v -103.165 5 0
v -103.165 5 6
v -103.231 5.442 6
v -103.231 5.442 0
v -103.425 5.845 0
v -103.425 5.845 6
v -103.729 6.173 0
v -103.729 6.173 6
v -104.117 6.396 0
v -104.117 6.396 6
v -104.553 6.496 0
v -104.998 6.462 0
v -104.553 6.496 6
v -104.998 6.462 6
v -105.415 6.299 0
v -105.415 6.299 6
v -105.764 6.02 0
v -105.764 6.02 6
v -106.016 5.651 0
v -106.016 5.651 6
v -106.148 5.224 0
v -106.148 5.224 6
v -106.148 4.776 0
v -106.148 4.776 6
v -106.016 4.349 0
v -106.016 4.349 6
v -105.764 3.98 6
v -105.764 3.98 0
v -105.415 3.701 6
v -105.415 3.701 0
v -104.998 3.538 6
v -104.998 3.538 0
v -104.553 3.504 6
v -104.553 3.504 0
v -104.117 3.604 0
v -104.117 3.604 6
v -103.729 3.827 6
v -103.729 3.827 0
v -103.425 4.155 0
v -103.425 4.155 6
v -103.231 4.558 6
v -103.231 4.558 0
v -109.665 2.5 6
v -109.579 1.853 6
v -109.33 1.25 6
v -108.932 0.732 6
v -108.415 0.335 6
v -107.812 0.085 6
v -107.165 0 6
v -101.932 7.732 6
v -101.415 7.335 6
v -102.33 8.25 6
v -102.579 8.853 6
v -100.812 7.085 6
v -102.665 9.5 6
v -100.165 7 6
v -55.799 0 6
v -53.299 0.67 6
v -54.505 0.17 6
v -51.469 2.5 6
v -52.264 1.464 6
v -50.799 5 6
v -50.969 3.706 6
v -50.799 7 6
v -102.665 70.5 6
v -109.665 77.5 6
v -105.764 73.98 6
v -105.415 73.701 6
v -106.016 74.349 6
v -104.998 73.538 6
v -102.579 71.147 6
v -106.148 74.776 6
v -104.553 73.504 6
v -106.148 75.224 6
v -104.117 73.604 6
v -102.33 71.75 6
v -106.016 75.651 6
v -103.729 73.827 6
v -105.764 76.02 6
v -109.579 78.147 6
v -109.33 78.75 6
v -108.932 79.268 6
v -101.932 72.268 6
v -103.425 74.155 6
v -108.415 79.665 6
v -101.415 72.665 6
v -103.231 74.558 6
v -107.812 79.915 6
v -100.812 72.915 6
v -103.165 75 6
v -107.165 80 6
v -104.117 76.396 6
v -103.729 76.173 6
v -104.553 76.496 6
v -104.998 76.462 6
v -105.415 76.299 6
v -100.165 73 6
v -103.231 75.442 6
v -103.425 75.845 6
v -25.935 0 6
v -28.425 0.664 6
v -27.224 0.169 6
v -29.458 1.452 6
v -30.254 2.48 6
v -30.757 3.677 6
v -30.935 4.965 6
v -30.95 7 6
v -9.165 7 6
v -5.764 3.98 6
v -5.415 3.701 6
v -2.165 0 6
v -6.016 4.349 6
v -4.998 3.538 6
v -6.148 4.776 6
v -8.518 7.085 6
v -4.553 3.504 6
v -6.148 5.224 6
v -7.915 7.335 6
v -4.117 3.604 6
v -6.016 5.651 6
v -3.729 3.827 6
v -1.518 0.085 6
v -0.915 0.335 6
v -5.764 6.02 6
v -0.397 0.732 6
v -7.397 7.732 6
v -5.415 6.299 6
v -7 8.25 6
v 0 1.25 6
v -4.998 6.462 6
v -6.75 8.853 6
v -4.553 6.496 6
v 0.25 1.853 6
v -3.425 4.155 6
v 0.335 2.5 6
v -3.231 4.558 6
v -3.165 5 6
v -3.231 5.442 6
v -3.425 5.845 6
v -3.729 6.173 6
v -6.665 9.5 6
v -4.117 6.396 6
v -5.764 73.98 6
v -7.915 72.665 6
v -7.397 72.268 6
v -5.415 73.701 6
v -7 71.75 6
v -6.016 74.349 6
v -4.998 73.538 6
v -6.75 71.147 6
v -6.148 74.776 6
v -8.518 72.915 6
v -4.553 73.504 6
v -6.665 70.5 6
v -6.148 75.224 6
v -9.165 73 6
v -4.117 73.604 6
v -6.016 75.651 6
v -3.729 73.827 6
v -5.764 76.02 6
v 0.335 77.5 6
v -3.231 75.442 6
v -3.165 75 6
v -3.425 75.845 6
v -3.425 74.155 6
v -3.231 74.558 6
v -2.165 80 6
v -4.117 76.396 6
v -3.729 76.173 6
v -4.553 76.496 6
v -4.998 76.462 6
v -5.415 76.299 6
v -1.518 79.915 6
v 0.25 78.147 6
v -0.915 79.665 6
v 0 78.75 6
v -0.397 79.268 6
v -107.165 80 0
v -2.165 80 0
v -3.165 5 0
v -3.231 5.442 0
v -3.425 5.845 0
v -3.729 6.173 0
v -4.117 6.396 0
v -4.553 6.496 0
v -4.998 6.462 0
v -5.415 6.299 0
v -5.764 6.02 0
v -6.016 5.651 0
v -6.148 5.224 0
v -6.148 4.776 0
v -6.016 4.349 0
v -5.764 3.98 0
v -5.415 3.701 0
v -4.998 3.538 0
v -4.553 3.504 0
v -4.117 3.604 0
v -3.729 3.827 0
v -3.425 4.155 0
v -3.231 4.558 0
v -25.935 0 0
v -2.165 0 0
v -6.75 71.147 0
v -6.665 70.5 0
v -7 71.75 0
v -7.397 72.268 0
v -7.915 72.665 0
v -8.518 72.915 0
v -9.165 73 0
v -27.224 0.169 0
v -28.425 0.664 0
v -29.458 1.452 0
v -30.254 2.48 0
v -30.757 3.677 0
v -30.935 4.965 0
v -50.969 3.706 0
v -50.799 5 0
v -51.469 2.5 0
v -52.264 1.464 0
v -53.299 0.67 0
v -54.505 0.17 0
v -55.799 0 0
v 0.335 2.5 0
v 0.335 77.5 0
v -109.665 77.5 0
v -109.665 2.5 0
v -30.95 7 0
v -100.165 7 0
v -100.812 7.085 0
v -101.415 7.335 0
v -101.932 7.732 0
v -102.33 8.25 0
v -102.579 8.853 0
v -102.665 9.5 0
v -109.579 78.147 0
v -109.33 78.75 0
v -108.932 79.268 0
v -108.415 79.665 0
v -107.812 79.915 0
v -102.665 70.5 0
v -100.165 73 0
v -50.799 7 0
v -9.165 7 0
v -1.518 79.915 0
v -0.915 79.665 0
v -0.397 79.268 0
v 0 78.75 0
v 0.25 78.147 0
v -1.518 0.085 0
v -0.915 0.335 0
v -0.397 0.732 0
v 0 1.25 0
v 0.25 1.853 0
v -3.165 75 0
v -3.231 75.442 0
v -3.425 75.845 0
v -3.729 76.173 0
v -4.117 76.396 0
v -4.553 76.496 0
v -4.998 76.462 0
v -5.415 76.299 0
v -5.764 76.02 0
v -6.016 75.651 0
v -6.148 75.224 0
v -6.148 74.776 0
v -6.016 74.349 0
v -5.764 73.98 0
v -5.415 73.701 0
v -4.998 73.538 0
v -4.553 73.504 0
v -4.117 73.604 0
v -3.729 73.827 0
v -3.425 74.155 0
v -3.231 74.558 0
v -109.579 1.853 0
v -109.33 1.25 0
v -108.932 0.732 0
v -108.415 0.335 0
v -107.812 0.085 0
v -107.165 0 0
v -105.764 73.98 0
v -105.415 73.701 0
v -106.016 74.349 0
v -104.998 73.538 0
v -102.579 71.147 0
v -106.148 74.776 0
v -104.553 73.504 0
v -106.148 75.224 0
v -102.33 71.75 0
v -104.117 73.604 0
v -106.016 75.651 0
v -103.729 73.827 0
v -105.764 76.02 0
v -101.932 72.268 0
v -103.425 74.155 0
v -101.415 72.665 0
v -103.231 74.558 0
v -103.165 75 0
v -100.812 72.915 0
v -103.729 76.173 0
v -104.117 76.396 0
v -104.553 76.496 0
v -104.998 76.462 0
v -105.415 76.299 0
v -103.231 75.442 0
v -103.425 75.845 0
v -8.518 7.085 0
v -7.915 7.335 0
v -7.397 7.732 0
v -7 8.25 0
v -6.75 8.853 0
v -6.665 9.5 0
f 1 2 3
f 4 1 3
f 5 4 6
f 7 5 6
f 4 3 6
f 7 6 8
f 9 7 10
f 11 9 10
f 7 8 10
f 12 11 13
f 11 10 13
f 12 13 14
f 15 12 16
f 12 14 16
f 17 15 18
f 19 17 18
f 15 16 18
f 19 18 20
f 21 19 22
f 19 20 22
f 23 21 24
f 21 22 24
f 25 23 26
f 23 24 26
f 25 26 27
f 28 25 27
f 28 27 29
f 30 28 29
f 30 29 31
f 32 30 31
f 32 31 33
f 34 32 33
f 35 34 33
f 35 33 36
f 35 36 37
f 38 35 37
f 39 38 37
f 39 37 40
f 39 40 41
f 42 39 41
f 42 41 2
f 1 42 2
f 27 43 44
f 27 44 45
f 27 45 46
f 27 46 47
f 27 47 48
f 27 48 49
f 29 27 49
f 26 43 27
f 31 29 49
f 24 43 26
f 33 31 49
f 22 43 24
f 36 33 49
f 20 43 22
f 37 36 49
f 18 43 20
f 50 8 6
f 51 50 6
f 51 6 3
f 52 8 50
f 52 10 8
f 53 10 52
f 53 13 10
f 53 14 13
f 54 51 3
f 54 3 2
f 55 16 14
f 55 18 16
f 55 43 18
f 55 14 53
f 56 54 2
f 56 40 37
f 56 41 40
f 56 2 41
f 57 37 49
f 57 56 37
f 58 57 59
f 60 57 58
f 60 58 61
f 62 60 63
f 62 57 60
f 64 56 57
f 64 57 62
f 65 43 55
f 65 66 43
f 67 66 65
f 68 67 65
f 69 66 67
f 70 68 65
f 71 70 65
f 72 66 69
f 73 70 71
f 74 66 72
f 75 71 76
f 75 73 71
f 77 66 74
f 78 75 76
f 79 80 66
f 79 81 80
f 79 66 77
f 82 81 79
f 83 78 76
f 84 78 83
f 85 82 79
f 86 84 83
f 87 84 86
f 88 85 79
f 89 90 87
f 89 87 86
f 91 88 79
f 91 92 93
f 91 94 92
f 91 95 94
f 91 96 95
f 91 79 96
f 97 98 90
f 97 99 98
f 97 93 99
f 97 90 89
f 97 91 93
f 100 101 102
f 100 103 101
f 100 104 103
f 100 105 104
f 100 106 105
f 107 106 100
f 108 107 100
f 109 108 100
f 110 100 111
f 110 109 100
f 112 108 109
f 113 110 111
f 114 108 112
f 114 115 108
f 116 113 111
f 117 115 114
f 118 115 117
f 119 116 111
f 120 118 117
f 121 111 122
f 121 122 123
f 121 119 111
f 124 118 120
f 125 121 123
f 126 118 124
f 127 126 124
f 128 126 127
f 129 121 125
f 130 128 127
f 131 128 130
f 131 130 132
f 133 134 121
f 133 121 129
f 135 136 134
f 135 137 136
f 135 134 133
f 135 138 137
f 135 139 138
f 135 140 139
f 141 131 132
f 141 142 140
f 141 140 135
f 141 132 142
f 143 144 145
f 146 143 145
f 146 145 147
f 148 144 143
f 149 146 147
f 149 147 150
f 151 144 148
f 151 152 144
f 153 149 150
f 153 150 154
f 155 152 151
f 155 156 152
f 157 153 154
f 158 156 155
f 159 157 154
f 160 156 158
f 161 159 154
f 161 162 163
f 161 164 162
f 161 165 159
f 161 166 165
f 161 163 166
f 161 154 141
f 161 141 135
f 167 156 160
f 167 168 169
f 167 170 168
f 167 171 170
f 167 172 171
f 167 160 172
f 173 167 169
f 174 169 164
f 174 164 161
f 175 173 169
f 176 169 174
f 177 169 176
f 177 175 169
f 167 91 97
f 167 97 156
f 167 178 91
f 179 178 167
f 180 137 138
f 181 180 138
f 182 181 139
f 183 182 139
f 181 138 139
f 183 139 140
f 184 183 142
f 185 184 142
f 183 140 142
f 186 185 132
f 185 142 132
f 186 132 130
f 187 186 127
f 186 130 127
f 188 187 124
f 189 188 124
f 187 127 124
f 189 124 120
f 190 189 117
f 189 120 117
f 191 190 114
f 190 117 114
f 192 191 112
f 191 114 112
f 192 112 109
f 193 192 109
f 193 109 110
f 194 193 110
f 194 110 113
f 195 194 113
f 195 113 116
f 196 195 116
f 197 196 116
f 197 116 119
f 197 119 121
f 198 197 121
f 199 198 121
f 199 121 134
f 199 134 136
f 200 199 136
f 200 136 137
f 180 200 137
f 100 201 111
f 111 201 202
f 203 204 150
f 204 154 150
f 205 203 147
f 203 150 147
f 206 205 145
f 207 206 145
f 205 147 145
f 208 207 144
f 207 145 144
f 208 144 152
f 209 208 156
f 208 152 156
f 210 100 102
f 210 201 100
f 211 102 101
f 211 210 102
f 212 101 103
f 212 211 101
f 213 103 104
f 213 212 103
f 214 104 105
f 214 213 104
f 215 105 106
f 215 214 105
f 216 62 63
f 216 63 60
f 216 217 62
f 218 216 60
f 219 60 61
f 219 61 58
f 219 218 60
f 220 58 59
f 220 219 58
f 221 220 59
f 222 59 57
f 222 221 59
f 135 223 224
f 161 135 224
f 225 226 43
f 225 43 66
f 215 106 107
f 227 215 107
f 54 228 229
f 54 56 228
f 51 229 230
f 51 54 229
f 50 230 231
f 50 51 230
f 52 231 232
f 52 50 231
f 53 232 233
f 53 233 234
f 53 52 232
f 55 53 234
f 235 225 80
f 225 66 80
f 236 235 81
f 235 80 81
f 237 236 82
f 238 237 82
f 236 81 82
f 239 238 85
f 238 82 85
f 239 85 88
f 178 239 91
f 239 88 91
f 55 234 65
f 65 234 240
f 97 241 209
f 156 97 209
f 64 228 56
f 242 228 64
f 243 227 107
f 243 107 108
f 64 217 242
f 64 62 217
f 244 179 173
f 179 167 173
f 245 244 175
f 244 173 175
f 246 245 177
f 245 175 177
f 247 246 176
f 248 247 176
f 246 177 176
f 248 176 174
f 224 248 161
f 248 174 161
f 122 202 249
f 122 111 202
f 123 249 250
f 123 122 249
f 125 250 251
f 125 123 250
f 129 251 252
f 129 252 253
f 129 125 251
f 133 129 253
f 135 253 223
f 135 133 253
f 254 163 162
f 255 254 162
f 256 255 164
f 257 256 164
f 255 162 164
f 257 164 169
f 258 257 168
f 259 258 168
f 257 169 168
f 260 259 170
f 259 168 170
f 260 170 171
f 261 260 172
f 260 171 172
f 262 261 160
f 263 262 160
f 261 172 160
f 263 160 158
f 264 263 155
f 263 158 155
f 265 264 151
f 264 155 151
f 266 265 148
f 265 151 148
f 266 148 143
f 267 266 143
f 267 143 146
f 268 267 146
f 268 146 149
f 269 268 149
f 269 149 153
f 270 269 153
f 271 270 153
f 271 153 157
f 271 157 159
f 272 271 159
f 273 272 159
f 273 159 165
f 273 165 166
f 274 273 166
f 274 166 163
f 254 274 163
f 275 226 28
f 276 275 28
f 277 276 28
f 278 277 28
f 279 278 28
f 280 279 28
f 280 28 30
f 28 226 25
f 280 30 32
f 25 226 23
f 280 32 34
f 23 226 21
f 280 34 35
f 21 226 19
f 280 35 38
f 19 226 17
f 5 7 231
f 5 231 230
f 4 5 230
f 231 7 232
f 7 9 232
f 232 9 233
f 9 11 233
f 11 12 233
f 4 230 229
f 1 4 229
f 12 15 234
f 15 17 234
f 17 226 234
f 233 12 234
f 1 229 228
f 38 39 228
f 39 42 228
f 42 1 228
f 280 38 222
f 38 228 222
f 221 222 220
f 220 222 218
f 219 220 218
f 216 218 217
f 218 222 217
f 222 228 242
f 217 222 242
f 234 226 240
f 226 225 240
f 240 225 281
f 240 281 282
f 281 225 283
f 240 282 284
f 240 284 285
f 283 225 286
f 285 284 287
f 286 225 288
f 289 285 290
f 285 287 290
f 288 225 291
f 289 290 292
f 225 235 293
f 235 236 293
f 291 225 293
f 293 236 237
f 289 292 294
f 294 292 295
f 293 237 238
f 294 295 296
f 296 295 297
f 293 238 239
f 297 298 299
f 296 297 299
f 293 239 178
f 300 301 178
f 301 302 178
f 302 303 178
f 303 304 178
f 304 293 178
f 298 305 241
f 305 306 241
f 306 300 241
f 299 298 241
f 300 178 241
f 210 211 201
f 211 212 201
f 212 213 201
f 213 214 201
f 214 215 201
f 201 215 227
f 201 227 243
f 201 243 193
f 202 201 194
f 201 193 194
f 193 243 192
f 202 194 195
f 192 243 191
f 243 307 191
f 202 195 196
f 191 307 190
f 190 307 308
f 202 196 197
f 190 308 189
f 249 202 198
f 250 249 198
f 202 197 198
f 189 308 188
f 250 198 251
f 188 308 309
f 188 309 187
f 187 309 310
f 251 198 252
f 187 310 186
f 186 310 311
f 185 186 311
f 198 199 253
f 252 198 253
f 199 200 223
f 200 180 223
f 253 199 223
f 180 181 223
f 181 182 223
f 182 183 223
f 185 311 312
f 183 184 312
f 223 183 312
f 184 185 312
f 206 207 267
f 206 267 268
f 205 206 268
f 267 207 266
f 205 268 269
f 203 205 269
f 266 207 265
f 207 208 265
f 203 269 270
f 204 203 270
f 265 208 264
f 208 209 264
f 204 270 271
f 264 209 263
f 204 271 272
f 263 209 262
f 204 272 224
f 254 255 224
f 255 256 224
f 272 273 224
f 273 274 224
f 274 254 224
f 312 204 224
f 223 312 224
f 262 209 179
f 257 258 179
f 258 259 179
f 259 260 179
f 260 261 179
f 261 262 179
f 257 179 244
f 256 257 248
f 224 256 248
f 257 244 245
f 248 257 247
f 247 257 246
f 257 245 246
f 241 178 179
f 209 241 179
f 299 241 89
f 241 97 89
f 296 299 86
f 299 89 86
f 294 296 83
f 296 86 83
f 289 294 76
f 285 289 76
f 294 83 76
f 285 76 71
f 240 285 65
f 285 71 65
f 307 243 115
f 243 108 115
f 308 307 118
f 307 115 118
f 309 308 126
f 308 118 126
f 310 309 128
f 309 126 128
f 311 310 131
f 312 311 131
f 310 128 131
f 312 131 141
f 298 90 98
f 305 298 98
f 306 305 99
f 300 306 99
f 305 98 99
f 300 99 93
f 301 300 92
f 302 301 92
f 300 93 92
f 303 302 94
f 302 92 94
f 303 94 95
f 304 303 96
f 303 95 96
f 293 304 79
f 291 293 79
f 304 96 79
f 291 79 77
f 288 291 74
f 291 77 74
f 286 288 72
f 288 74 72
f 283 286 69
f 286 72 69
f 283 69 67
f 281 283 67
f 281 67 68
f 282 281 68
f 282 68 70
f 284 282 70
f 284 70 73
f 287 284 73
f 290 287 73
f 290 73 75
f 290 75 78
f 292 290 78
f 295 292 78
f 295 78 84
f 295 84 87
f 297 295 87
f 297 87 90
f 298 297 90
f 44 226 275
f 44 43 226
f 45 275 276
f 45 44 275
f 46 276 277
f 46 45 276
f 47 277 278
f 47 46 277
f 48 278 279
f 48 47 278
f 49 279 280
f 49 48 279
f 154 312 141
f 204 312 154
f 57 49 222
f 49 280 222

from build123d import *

# Parameters (mm, degrees)
SKETCH2_W               = 110
SKETCH2_H               = 80
SKETCH2_W_2             = 96
SKETCH2_H_2             = 66
BOSS_EXTRUDE2_DEPTH     = 6
FILLET1_R               = 2.5
SKETCH3_R               = 1.5
CUT_EXTRUDE1_DEPTH      = 136.876166867
FILLET2_R               = 2.5
CUT_EXTRUDE2_DEPTH      = 136.876166867
CUT_EXTRUDE2_DEPTH_BACK = 136.876166867
FILLET3_R               = 5


with BuildPart() as part:
    # Sketch2 → Boss-Extrude2 (new body)
    with BuildSketch(Plane.XY):
        with Locations((-54.66463752, 40)):
            Rectangle(SKETCH2_W, SKETCH2_H)
        with Locations((-54.66463752, 40)):
            Rectangle(SKETCH2_W_2, SKETCH2_H_2, mode=Mode.SUBTRACT)
    extrude(amount=BOSS_EXTRUDE2_DEPTH)

    # Fillet1
    fillet1_edges = [part.edges().sort_by_distance(p)[0] for p in [
        (-6.66463752, 7, 3),
        (-6.66463752, 73, 3),
        (-102.66463752, 73, 3),
        (-102.66463752, 7, 3),
    ]]
    fillet(fillet1_edges, radius=FILLET1_R)

    # Sketch3 → Cut-Extrude1 (cut, through all)
    with BuildSketch(Plane.XY.offset(6)):
        with Locations((-4.66463752, 75)):
            Circle(SKETCH3_R)
        with Locations((-4.66463752, 5)):
            Circle(SKETCH3_R)
        with Locations((-104.66463752, 5)):
            Circle(SKETCH3_R)
        with Locations((-104.66463752, 75)):
            Circle(SKETCH3_R)
    extrude(amount=-CUT_EXTRUDE1_DEPTH, mode=Mode.SUBTRACT)

    # Fillet2
    fillet2_edges = [part.edges().sort_by_distance(p)[0] for p in [
        (0.33536248, 0, 3),
        (-109.66463752, 0, 3),
        (-109.66463752, 80, 3),
        (0.33536248, 80, 3),
    ]]
    fillet(fillet2_edges, radius=FILLET2_R)

    # Sketch4 → Cut-Extrude2 (cut, two sides: drawn at the far end of the back side and taken through both)
    with BuildSketch(Plane(origin=(0, 0, 0), x_dir=(-1, 0, 0), z_dir=(0, 0, -1)).offset(-CUT_EXTRUDE2_DEPTH_BACK)):
        Polygon((29.236938862, -234.527844878), (30.900112939, 0), (30.949754032, 7), (50.799101604, 7), (50.799101604, 0), (50.799101604, -234.533742073), (50.670812865, -703.601208677), (29.108650122, -703.595311481), align=None)
    extrude(amount=CUT_EXTRUDE2_DEPTH + CUT_EXTRUDE2_DEPTH_BACK, mode=Mode.SUBTRACT)

    # Fillet3
    fillet3_edges = [part.edges().sort_by_distance(p)[0] for p in [
        (-30.900112939, 0, 3),
        (-50.799101604, 0, 3),
    ]]
    fillet(fillet3_edges, radius=FILLET3_R)


solid = part.part
